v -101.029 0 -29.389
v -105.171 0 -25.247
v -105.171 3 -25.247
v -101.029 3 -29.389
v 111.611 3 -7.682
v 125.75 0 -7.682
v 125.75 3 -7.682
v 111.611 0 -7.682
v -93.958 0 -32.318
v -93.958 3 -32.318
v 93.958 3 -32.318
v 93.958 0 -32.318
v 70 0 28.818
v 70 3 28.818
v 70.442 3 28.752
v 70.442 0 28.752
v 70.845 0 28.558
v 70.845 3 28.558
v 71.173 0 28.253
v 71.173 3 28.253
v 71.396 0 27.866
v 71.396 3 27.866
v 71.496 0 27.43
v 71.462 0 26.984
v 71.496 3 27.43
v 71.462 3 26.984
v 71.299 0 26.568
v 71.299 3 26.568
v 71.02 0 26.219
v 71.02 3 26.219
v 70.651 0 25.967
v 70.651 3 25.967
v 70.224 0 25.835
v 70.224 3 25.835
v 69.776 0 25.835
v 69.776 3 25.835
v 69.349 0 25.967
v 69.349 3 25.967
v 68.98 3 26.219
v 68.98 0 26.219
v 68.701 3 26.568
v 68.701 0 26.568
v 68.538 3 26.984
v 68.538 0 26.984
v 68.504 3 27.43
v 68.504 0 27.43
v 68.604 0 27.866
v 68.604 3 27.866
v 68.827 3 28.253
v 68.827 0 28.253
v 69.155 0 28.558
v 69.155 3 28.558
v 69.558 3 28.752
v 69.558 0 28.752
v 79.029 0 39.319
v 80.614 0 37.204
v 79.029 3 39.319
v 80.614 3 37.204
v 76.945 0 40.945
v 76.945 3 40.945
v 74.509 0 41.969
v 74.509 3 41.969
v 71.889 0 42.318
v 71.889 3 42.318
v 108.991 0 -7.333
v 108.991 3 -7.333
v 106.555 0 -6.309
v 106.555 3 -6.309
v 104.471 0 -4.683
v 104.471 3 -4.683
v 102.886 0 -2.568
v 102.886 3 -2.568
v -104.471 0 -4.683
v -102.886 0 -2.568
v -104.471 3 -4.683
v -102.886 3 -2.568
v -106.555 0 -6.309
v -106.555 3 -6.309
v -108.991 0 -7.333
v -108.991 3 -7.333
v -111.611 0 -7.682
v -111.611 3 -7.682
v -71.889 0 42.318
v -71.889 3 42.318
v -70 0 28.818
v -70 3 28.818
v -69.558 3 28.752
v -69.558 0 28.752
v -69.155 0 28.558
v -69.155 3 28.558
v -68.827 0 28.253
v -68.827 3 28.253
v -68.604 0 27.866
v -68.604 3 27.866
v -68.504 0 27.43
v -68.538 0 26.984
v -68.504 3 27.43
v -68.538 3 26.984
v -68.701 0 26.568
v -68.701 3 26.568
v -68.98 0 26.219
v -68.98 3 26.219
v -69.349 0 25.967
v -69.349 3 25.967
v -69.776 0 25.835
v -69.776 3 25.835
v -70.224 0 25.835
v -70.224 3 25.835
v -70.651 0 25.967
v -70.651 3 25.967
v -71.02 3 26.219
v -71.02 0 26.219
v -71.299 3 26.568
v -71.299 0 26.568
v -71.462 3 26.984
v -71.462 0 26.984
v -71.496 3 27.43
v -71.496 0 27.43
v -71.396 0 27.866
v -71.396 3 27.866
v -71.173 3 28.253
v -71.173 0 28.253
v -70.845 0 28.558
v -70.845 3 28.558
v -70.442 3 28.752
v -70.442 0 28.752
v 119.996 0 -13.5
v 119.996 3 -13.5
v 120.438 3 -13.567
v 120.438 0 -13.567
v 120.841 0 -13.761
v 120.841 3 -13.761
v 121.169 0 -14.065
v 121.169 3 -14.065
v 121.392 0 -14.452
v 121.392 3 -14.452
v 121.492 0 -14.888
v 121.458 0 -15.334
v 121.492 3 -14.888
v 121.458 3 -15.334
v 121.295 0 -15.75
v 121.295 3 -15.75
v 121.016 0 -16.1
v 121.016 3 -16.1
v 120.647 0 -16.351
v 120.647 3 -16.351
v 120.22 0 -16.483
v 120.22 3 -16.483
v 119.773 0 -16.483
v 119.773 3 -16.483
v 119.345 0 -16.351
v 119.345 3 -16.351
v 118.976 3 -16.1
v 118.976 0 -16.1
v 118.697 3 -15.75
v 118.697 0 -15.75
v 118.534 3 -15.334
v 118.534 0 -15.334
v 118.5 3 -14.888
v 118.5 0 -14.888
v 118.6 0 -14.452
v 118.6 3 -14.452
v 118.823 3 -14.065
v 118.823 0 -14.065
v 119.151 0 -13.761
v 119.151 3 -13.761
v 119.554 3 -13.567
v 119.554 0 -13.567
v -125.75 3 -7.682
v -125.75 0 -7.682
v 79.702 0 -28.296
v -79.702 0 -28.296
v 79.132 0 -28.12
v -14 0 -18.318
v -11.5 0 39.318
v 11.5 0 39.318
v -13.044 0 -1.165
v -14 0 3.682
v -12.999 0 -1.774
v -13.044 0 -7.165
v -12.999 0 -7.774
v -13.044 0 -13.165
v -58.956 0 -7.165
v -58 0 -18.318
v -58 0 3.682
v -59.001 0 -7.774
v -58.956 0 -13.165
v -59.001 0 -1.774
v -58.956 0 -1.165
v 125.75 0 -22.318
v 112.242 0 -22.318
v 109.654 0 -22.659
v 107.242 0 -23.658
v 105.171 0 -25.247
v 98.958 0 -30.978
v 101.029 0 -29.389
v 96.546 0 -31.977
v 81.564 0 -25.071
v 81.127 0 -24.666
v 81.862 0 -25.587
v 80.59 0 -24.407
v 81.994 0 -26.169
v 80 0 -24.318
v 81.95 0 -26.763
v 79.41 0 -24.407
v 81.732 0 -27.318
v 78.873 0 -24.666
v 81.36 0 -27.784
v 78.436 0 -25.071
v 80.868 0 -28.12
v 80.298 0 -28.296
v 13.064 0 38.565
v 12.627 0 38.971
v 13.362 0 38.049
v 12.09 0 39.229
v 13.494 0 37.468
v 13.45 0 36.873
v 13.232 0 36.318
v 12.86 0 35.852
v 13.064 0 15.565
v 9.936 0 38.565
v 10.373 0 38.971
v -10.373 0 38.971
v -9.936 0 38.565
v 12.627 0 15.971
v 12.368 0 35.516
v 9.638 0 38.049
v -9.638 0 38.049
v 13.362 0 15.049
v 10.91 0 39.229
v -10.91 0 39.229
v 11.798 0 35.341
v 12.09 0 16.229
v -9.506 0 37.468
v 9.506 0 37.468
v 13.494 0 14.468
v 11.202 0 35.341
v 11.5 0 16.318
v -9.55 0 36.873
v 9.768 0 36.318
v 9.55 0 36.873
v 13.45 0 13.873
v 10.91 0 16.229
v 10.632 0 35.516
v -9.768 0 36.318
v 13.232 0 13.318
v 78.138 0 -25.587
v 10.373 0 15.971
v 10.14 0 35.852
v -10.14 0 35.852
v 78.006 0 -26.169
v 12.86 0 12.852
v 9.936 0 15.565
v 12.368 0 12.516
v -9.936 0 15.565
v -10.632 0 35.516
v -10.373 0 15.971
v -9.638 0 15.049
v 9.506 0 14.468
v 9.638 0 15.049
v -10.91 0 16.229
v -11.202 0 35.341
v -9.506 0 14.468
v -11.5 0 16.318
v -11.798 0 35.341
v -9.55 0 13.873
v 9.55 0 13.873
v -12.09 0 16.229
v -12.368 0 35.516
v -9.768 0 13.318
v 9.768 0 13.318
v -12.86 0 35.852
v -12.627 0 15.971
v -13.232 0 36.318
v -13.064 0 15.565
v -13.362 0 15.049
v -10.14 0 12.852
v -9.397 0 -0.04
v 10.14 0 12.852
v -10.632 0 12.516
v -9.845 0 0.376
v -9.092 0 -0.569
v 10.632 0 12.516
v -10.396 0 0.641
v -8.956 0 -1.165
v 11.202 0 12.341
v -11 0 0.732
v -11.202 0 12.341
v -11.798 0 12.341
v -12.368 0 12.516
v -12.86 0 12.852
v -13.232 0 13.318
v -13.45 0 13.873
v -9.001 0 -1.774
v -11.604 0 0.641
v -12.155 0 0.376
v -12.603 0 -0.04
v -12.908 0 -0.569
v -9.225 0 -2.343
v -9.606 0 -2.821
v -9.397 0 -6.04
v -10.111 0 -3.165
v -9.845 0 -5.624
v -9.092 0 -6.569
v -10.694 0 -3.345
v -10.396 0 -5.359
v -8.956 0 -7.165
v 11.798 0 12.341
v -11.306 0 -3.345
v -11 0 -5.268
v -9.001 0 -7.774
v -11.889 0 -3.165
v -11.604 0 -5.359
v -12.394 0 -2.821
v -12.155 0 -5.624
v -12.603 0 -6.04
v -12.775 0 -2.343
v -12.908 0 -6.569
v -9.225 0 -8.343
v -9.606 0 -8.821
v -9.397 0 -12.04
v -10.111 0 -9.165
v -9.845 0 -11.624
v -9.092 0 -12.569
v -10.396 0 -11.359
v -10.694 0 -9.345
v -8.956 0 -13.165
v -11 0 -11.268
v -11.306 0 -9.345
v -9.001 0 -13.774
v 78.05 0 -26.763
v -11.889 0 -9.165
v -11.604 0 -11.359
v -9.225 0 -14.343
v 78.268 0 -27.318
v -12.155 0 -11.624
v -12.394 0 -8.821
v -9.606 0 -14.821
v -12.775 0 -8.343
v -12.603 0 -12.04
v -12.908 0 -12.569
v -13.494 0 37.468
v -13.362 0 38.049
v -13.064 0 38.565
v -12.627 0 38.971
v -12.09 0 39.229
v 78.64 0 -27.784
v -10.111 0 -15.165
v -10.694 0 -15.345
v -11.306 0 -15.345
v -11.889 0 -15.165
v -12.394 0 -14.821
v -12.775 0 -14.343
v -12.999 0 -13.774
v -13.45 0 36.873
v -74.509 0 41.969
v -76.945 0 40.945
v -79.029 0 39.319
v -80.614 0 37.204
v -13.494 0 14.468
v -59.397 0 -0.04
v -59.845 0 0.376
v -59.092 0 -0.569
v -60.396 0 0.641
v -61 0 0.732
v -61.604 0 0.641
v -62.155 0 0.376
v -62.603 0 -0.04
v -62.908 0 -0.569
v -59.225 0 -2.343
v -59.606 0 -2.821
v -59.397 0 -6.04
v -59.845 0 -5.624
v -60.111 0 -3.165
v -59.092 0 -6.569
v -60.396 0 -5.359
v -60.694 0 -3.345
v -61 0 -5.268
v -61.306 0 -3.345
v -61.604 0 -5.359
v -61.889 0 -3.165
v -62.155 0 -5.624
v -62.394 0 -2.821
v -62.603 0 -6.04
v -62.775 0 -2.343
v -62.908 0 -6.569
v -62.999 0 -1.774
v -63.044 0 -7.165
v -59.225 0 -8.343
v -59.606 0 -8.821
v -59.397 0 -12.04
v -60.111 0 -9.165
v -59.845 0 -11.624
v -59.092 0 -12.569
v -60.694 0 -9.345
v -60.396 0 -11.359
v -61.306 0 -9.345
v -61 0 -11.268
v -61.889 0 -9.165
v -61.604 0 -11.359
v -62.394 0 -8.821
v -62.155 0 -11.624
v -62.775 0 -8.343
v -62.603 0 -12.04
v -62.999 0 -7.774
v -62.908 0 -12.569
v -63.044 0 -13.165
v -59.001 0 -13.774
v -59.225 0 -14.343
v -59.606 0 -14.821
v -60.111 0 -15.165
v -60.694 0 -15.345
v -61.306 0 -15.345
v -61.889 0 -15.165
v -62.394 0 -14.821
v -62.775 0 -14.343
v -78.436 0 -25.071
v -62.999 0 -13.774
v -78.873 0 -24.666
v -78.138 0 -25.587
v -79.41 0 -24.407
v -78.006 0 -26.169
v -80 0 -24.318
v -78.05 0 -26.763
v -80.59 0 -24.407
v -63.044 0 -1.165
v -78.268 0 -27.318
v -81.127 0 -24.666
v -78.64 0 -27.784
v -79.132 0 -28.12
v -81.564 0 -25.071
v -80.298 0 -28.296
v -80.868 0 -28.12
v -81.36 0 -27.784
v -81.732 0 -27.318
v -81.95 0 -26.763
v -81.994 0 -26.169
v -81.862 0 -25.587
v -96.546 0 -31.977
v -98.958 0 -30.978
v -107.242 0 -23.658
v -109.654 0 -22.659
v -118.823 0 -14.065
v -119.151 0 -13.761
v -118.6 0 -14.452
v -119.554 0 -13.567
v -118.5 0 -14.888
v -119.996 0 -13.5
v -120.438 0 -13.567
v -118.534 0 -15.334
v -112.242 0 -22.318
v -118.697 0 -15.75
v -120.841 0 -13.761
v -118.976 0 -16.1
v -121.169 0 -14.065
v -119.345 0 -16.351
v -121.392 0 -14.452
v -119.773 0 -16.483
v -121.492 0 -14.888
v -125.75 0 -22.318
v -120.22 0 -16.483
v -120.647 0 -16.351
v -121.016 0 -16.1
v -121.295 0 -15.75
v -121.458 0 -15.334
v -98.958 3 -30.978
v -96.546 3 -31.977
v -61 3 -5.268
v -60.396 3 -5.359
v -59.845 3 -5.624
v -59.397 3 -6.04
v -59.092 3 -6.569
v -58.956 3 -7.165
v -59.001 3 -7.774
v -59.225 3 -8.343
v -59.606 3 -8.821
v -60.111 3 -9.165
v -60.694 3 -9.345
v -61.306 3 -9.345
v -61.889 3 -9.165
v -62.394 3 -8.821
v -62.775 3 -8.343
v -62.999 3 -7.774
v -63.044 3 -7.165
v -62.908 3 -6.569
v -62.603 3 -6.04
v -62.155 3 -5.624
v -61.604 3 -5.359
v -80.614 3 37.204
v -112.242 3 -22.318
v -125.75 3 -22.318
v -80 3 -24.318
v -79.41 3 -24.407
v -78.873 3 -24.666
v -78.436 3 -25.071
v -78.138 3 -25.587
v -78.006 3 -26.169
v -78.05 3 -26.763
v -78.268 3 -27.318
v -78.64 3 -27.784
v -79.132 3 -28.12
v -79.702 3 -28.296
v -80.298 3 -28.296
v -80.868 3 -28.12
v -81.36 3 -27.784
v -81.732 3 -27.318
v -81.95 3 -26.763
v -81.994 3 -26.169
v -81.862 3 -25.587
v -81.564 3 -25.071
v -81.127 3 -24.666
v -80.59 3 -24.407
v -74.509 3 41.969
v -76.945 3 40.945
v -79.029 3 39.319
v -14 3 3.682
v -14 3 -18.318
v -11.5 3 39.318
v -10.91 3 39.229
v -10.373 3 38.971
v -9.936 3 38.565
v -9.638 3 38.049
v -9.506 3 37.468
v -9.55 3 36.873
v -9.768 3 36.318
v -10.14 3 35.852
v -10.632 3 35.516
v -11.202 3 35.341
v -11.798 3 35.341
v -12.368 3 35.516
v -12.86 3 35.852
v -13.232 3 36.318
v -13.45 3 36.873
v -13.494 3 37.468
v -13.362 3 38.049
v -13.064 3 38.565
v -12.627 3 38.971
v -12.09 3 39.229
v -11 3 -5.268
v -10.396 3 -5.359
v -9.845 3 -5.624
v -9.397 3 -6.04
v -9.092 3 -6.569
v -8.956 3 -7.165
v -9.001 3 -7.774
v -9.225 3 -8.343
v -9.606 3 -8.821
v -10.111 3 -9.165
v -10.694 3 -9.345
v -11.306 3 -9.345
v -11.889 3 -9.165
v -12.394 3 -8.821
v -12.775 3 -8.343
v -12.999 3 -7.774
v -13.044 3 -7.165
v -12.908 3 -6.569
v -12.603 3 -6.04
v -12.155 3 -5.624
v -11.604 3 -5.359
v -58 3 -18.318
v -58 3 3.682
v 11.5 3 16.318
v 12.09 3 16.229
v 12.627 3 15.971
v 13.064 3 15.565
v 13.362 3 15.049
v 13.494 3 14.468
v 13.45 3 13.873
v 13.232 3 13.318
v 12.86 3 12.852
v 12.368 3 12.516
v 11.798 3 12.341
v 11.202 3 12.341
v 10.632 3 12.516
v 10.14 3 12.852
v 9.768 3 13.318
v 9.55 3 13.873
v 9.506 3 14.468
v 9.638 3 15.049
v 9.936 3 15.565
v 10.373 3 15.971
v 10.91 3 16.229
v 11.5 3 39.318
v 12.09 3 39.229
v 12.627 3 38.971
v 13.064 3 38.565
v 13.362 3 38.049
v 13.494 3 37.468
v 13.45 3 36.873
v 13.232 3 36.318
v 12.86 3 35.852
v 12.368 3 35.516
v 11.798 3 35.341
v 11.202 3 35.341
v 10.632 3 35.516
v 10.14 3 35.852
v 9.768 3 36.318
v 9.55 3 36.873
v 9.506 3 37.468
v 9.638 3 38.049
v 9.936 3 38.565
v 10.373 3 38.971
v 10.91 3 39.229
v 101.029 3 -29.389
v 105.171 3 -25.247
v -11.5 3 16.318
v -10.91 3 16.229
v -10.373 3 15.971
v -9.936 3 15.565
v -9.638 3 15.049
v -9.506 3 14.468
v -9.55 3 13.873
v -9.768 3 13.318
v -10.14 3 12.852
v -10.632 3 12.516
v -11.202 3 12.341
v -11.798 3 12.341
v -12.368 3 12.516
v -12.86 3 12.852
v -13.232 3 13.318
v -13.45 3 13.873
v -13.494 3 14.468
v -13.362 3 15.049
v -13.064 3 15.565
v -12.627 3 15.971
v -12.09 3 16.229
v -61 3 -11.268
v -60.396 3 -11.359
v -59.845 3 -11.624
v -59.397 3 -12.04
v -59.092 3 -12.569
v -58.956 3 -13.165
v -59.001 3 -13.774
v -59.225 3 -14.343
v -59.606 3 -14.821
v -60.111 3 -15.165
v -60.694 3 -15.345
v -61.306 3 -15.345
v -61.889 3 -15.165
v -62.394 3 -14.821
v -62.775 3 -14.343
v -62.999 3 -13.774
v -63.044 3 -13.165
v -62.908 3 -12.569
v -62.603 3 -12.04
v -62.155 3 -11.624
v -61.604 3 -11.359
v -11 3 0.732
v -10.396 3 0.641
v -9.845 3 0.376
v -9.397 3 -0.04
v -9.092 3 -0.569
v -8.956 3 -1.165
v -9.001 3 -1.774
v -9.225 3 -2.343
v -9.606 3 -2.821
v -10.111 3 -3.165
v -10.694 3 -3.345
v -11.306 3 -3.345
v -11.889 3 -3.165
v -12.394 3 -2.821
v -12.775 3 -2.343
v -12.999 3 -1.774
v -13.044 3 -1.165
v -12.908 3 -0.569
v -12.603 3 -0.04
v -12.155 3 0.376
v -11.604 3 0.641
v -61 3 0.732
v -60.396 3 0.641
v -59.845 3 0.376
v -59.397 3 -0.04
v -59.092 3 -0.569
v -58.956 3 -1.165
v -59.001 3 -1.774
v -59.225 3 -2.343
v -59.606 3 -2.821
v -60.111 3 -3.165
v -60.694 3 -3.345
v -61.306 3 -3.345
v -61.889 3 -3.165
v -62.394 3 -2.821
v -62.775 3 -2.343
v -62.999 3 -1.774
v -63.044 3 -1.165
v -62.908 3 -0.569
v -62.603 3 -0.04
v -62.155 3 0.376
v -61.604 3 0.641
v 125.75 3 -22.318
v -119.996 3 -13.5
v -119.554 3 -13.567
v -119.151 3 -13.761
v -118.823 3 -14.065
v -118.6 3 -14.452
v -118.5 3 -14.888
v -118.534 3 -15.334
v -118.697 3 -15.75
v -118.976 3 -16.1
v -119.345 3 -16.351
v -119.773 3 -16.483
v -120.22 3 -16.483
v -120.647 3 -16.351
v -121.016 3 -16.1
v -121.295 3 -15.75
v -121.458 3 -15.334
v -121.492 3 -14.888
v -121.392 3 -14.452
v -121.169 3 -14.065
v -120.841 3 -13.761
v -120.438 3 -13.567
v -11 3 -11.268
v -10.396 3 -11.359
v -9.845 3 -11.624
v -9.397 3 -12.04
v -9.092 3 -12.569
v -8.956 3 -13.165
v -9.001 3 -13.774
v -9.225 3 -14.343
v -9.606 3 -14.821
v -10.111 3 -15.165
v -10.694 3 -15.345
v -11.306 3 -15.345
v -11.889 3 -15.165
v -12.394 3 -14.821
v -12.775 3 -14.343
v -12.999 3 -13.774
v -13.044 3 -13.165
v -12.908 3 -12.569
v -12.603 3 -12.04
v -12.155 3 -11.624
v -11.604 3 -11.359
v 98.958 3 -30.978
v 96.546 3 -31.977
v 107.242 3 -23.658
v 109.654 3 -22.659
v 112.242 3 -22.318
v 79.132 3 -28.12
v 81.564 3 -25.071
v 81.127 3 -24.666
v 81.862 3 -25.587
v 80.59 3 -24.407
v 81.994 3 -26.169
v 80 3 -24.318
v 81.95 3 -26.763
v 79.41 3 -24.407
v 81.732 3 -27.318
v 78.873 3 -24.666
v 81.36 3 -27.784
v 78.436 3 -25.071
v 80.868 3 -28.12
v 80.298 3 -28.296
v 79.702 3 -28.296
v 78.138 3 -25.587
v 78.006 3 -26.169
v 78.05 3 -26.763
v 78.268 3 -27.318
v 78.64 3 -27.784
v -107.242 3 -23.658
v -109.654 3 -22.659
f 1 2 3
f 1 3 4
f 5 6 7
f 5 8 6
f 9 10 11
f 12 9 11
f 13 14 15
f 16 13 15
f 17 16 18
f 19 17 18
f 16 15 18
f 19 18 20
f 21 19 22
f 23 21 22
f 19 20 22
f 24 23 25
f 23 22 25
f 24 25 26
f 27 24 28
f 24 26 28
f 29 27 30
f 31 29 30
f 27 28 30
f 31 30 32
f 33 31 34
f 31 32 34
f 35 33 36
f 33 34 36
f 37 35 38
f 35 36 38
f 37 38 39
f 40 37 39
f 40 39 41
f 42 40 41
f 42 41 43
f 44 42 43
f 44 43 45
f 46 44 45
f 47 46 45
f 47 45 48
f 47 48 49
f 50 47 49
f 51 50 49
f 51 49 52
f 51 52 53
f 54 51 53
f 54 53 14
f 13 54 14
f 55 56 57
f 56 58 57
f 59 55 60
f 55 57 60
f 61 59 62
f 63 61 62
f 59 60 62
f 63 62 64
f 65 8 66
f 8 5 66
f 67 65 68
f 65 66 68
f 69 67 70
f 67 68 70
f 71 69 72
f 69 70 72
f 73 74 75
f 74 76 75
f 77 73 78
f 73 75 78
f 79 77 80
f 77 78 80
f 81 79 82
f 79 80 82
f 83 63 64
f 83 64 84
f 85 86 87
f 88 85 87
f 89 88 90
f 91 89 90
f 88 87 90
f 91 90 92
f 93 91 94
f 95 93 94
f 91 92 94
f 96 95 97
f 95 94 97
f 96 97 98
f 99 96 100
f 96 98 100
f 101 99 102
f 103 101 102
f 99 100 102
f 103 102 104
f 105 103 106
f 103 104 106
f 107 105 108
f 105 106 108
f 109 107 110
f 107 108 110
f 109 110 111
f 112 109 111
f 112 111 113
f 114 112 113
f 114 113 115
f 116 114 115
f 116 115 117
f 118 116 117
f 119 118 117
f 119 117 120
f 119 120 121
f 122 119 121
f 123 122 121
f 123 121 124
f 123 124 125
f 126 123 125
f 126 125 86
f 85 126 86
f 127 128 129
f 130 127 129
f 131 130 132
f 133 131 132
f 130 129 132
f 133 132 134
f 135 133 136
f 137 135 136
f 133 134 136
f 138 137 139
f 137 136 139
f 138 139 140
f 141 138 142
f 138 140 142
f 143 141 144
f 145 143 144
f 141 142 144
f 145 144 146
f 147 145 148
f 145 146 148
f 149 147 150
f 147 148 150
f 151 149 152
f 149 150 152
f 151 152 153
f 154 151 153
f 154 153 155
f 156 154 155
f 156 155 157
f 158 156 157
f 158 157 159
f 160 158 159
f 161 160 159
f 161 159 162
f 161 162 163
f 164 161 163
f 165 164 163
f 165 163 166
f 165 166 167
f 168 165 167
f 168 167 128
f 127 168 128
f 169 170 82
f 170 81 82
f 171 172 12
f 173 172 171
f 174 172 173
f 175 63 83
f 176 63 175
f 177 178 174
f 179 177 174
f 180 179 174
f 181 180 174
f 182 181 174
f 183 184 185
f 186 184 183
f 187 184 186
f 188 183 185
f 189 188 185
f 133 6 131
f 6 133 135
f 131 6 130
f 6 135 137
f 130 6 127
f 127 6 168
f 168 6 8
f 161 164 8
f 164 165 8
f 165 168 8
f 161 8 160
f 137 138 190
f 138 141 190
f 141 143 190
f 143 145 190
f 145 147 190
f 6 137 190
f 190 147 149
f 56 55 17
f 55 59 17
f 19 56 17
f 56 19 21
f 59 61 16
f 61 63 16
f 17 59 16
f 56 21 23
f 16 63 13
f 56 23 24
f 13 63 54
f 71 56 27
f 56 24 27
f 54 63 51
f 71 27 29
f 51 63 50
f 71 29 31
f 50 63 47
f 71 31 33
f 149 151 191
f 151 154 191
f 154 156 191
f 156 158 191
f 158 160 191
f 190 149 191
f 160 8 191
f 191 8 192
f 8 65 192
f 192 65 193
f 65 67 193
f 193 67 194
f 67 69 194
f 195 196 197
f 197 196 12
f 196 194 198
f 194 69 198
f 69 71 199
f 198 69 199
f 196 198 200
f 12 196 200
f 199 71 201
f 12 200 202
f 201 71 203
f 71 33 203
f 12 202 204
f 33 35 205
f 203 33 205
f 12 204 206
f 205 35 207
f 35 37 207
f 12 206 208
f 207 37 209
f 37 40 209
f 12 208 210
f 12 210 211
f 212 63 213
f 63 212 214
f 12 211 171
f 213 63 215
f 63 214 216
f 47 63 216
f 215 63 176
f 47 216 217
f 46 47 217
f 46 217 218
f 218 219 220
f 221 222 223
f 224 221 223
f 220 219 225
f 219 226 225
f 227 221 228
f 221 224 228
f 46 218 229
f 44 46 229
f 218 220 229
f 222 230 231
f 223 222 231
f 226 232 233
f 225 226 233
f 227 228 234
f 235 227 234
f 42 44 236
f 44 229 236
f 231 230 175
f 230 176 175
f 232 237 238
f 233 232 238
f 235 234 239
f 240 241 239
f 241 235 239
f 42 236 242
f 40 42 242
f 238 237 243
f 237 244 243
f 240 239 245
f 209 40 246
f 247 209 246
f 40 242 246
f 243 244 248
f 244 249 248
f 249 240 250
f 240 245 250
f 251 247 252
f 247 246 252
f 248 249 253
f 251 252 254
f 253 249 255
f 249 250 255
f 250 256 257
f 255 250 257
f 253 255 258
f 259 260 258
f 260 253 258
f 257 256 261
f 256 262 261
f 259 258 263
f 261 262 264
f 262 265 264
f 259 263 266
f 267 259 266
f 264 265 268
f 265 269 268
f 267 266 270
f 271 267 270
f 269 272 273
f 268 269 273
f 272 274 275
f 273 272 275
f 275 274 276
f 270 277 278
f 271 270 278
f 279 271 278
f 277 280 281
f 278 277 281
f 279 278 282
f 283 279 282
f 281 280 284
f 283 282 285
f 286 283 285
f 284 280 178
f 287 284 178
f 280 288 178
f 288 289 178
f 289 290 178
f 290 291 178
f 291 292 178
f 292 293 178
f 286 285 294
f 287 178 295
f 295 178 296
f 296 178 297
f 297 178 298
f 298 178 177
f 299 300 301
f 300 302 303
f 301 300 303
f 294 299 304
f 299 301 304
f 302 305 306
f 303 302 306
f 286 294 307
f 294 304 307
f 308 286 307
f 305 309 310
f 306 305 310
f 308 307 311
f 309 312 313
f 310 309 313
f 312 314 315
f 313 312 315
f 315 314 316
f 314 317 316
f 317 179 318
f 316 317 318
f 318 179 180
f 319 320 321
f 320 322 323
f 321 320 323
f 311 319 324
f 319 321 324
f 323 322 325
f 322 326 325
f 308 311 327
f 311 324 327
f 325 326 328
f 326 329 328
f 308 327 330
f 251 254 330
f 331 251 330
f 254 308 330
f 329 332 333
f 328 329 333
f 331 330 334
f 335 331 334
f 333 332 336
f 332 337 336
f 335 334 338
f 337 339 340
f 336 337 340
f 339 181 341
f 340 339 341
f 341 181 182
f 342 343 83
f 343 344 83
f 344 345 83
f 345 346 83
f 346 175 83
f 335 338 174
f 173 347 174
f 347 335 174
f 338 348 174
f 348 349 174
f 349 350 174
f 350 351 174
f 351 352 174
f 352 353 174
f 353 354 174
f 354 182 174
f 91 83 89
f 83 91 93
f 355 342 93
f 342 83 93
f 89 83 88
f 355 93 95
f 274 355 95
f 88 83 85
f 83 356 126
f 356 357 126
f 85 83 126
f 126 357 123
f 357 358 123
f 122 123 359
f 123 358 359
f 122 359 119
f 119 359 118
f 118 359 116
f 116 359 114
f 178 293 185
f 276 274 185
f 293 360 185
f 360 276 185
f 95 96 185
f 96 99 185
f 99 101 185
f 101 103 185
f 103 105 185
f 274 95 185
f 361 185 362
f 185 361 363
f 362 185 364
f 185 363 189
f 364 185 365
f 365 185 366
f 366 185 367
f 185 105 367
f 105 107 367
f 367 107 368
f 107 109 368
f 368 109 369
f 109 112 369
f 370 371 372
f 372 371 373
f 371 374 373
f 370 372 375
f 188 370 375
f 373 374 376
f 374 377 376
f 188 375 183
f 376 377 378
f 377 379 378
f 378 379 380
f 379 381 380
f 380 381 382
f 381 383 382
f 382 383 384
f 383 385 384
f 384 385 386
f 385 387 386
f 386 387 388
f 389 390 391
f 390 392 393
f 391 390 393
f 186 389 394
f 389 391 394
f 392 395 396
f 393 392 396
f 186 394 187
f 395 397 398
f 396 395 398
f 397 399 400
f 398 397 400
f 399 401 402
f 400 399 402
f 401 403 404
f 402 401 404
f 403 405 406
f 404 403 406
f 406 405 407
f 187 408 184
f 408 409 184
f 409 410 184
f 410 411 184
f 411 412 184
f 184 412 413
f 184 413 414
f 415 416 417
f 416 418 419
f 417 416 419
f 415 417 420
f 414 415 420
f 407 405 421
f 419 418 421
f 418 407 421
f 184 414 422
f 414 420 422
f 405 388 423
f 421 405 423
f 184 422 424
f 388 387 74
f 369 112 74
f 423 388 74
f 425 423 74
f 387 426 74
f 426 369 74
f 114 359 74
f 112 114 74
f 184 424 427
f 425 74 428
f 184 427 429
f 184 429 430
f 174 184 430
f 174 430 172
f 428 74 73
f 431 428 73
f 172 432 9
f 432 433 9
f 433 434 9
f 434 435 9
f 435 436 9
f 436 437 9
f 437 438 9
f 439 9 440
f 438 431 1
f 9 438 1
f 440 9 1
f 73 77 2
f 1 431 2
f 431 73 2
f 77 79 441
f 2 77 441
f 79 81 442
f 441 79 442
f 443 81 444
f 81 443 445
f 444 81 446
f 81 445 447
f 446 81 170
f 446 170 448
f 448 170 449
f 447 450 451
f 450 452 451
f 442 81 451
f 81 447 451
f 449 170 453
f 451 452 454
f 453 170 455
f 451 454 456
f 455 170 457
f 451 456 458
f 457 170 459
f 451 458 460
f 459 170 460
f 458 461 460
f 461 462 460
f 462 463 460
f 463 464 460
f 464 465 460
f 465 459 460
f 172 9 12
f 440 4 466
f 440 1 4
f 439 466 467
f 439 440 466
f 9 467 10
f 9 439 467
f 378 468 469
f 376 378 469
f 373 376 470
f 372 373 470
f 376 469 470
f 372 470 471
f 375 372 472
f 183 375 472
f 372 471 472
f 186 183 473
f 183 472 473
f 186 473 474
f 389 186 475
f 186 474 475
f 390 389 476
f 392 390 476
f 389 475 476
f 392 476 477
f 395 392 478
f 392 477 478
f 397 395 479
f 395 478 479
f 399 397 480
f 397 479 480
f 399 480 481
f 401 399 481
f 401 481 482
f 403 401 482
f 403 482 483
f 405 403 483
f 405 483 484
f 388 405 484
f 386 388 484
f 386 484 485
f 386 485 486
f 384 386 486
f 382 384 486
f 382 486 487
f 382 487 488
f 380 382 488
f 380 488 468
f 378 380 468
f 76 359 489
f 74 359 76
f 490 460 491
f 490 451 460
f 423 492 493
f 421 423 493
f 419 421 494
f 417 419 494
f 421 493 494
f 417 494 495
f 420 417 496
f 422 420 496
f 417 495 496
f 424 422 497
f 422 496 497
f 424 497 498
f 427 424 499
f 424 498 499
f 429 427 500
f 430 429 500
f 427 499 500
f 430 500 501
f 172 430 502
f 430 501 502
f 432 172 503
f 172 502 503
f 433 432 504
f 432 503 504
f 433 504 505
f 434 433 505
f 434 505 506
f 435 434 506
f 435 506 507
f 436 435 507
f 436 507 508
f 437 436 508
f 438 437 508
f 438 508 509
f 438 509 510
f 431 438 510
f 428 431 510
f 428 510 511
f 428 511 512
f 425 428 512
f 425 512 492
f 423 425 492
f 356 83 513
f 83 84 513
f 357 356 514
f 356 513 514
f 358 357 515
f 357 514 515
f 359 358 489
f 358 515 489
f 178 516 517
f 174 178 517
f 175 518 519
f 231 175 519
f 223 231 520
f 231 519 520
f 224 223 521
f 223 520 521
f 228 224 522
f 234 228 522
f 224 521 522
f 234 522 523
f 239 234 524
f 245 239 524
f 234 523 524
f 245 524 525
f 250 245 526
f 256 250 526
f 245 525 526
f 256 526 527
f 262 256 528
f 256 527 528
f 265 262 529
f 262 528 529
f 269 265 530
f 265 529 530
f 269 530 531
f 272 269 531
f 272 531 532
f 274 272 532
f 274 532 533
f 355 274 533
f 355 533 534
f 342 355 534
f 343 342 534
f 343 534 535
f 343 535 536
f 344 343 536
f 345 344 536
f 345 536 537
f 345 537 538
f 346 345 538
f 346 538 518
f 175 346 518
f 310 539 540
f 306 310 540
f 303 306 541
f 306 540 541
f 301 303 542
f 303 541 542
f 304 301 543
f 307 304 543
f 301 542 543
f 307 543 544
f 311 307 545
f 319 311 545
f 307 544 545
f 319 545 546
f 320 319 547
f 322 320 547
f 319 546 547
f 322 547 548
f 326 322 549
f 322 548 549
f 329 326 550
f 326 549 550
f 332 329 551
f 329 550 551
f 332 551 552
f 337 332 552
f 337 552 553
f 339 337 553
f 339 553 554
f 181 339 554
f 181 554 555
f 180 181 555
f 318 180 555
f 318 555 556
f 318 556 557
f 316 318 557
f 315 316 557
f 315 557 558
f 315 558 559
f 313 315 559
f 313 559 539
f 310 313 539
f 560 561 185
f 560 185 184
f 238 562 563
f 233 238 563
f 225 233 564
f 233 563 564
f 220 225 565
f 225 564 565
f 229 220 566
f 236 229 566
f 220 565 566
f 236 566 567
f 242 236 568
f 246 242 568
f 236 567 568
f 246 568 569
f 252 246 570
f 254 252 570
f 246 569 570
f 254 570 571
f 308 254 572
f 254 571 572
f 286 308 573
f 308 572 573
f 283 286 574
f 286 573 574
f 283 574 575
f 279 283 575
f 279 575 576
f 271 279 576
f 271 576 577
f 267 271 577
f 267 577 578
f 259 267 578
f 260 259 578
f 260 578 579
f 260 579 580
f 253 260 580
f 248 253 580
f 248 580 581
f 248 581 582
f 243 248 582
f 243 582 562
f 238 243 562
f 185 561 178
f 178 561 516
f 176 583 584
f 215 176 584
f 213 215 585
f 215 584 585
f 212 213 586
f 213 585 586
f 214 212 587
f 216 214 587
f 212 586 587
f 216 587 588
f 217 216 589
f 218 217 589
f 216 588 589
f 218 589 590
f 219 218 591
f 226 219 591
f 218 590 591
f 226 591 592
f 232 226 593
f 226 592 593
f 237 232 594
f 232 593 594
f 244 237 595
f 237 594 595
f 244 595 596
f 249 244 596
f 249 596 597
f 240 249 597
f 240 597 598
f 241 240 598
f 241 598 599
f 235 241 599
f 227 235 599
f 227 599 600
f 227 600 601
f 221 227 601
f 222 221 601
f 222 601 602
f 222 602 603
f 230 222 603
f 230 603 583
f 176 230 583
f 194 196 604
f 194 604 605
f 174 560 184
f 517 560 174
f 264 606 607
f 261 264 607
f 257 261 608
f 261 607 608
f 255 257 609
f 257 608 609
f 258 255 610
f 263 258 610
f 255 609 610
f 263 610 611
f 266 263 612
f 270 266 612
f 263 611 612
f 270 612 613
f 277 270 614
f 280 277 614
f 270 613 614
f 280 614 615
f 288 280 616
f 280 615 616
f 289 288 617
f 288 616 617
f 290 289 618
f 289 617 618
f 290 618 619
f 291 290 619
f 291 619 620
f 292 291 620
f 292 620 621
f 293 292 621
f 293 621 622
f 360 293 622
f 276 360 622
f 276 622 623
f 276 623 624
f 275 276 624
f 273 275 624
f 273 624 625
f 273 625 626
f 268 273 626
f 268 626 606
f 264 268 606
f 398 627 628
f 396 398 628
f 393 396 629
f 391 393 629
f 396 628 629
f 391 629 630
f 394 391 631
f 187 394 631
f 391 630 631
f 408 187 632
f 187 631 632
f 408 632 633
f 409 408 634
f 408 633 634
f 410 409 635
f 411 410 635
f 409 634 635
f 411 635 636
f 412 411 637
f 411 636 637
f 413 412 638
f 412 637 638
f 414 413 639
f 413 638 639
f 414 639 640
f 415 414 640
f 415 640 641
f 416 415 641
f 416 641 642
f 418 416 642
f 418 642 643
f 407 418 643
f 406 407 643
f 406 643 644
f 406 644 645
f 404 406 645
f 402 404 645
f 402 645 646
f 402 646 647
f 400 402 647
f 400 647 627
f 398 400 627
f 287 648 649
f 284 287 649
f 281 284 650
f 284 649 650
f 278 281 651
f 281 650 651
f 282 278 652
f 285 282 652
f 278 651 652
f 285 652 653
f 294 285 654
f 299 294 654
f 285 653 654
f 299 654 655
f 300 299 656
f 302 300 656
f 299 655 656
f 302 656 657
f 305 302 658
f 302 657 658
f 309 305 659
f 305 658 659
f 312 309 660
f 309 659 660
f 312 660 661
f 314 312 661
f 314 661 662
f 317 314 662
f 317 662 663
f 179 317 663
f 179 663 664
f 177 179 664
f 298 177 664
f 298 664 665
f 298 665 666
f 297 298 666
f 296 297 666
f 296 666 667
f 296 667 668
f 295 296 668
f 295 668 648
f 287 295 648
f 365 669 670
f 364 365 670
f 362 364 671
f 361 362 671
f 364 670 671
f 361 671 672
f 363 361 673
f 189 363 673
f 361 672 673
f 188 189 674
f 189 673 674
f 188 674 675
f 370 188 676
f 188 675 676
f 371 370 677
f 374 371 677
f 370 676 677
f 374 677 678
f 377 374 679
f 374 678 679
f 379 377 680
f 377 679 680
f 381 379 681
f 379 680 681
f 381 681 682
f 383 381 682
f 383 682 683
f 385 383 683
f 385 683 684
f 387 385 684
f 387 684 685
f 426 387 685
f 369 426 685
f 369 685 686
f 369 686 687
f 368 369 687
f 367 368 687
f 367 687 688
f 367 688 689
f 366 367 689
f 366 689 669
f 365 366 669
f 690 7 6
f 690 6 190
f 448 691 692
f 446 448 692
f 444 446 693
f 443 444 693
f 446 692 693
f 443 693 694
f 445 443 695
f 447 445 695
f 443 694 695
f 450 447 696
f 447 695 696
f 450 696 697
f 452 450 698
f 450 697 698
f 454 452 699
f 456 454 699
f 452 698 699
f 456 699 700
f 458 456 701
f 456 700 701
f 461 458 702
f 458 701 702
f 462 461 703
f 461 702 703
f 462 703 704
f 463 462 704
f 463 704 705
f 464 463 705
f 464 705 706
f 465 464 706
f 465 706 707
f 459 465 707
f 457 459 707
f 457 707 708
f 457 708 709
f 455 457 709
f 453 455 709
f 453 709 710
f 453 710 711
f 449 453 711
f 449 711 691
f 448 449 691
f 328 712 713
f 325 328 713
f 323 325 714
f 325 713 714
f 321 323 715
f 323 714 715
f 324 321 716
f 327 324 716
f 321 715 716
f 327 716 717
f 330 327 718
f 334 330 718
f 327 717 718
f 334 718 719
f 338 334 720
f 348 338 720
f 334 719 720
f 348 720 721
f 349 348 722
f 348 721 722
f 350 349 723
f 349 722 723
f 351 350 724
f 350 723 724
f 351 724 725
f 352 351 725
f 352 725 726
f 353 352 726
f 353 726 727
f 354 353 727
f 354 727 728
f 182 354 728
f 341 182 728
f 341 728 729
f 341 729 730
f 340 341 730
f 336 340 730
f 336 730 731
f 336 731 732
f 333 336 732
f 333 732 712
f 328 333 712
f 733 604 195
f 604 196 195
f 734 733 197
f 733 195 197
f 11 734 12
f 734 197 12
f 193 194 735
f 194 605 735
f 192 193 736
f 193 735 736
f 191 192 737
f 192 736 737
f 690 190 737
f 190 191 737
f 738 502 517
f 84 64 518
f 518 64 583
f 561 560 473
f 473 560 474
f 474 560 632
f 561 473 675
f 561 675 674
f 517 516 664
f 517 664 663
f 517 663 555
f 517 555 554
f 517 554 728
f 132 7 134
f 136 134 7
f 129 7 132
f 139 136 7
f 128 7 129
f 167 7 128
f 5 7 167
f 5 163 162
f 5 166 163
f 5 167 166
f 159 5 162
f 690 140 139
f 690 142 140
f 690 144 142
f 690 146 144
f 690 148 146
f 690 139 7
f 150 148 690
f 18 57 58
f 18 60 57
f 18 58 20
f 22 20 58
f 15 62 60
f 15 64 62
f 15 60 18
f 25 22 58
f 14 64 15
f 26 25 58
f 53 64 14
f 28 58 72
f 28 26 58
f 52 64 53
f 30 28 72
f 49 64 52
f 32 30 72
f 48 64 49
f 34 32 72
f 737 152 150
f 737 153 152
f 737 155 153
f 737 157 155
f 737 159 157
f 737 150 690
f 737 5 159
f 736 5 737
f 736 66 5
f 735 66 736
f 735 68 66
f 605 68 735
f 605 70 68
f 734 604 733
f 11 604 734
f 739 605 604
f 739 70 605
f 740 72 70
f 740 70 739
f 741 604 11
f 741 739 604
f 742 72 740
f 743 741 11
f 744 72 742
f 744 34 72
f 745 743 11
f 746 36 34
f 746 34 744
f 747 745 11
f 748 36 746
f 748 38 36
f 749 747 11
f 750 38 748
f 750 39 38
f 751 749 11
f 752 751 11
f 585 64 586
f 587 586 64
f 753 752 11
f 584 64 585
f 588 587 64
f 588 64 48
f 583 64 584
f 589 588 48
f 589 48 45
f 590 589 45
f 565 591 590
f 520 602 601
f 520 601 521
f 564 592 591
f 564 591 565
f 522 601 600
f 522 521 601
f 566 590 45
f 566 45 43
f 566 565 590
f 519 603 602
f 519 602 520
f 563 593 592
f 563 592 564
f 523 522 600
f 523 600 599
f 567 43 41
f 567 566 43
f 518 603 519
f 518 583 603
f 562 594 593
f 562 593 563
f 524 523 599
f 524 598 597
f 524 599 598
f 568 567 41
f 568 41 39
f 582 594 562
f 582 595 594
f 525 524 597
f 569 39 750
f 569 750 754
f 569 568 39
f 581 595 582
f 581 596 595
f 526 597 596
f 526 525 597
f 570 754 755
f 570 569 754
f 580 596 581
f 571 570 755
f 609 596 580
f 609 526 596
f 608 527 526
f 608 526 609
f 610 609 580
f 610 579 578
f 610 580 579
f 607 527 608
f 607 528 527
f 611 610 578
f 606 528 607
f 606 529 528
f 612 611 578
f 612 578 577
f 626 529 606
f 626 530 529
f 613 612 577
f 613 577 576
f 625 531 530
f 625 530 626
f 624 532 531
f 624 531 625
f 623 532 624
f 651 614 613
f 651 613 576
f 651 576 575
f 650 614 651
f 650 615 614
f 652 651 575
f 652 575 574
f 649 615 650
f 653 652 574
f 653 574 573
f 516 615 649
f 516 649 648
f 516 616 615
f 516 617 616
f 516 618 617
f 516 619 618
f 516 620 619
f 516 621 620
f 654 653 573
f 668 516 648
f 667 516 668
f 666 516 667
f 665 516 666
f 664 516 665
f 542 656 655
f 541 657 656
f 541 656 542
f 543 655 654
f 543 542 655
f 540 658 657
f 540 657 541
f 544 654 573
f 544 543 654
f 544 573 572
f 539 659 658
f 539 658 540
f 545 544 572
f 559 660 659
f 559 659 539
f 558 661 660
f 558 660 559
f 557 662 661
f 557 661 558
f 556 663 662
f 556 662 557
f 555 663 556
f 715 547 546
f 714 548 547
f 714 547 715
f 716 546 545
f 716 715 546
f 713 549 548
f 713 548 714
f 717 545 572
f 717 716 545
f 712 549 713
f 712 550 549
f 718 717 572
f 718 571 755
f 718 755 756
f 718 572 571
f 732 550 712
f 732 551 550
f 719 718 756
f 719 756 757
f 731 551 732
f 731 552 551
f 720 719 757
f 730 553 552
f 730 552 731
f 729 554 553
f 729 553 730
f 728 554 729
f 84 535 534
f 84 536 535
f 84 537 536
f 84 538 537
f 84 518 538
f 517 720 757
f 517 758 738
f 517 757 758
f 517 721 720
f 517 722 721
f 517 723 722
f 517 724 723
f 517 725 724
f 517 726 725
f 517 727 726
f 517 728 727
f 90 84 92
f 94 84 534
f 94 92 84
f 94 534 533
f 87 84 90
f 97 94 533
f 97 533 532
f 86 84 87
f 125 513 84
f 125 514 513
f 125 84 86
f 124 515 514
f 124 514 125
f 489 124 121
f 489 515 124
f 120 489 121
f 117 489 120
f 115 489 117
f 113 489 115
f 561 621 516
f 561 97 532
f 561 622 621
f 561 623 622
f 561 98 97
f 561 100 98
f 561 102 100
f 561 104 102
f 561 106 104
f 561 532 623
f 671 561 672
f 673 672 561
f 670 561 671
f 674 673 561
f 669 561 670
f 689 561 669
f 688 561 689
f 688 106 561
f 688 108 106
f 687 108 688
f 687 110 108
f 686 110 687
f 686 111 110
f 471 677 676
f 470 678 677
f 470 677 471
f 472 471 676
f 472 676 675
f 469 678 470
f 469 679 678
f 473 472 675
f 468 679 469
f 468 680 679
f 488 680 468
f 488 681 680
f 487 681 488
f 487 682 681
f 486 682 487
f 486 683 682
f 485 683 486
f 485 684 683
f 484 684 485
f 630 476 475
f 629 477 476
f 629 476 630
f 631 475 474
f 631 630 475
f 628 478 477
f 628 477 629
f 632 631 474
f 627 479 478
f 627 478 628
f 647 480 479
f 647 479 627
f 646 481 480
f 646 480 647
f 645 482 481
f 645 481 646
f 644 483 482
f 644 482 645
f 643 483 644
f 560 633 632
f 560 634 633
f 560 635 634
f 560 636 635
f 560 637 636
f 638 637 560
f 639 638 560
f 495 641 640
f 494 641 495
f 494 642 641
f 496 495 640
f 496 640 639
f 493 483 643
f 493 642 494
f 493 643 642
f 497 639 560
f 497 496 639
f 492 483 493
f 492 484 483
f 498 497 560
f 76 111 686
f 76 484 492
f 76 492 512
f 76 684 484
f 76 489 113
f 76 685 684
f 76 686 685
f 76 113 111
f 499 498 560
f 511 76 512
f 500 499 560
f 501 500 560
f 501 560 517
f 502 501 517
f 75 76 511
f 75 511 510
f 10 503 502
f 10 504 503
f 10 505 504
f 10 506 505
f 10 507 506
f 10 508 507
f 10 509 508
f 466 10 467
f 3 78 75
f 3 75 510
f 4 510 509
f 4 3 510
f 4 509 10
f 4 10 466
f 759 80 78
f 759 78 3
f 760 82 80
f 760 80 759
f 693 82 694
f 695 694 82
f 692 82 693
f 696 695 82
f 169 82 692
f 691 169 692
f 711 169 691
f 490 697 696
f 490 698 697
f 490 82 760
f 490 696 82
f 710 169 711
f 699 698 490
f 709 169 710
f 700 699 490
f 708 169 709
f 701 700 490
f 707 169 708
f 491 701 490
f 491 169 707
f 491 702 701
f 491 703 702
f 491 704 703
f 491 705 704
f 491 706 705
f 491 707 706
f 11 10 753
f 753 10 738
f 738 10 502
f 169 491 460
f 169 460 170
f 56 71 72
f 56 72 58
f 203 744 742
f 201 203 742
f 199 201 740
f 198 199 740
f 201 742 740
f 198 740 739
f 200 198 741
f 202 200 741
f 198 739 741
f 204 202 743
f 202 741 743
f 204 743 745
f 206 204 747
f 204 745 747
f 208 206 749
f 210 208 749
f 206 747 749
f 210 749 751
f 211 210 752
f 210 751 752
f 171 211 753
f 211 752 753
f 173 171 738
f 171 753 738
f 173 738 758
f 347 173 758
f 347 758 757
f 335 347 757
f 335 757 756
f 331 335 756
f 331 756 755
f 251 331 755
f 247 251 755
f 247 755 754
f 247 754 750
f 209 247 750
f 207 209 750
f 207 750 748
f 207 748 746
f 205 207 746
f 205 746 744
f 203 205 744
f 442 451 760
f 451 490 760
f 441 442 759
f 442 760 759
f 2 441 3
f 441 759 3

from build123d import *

# Parameters (mm, degrees)
SALIENTE_EXTRUIR1_DEPTH = 3
REDONDEO1_R             = 10
CROQUIS2_R              = 1.5
CROQUIS2_R_2            = 2
CROQUIS2_R_3            = 2.05
CROQUIS2_W              = 42
CROQUIS2_H              = 20
CORTAR_EXTRUIR1_DEPTH   = 135.610141171
CROQUIS3_W              = 4
CROQUIS3_H              = 14.636342218
CORTAR_EXTRUIR2_DEPTH   = 135.610141171
CROQUIS4_W              = 44
CROQUIS4_H              = 22
CORTAR_EXTRUIR3_DEPTH   = 131.820067673
CORTAR_EXTRUIR4_DEPTH   = 131.820067673
REDONDEO2_R             = 20
CORTAR_EXTRUIR5_DEPTH   = 10
REDONDEO3_R             = 10
CROQUIS7_W              = 14.636342218
CROQUIS7_H              = 3
SALIENTE_EXTRUIR2_DEPTH = 2
CROQUIS8_W              = 14.636342218
CROQUIS8_H              = 3
SALIENTE_EXTRUIR3_DEPTH = 2
CROQUIS10_R             = 2
CORTAR_EXTRUIR7_DEPTH   = 133.713564137


with BuildPart() as part:
    # Croquis1 → Saliente-Extruir1 (new body)
    with BuildSketch(Plane(origin=(0, 0, 0), x_dir=(1, 0, 0), z_dir=(0, 1, 0))):
        Polygon((-88.1, 42.318171109), (88.1, 42.318171109), (108.1, 22.318171109), (127.75, 22.318171109), (127.75, 7.681828891), (105.75, 7.681828891), (77.75, -42.318171109), (-77.75, -42.318171109), (-105.75, 7.681828891), (-127.75, 7.681828891), (-127.75, 22.318171109), (-108.1, 22.318171109), align=None)
    extrude(amount=SALIENTE_EXTRUIR1_DEPTH)

    # Redondeo1
    redondeo1_edges = [part.edges().sort_by_distance(p)[0] for p in [
        (-88.1, 1.5, -42.318171109),
        (88.1, 1.5, -42.318171109),
        (108.1, 1.5, -22.318171109),
        (105.75, 1.5, -7.681828891),
        (77.75, 1.5, 42.318171109),
        (-77.75, 1.5, 42.318171109),
        (-105.75, 1.5, -7.681828891),
        (-108.1, 1.5, -22.318171109),
    ]]
    fillet(redondeo1_edges, radius=REDONDEO1_R)

    # Croquis2 → Cortar-Extruir1 (cut, through all)
    with BuildSketch(Plane(origin=(0, 3, 0), x_dir=(1, 0, 0), z_dir=(0, 1, 0))):
        with Locations(Location((70, -27.318171109, 0), (0, 0, 270))):
            Circle(CROQUIS2_R)
        with Locations(Location((-70, -27.318171109, 0), (0, 0, 270))):
            Circle(CROQUIS2_R)
        with Locations(Location((-119.996067812, 15, 0), (0, 0, 270))):
            Circle(CROQUIS2_R)
        with Locations(Location((119.996067812, 15, 0), (0, 0, 270))):
            Circle(CROQUIS2_R)
        with Locations(Location((-11.5, -14.318171109, 0), (0, 0, 270))):
            Circle(CROQUIS2_R_2)
        with Locations(Location((11.5, -14.318171109, 0), (0, 0, 270))):
            Circle(CROQUIS2_R_2)
        with Locations(Location((-11.5, -37.318171109, 0), (0, 0, 270))):
            Circle(CROQUIS2_R_2)
        with Locations(Location((11.5, -37.318171109, 0), (0, 0, 270))):
            Circle(CROQUIS2_R_2)
        with Locations(Location((-61, 7.318171109, 0), (0, 0, 270))):
            Circle(CROQUIS2_R_3)
        with Locations(Location((-11, 7.318171109, 0), (0, 0, 270))):
            Circle(CROQUIS2_R_3)
        with Locations(Location((-61, 13.318171109, 0), (0, 0, 270))):
            Circle(CROQUIS2_R_3)
        with Locations(Location((-61, 1.318171109, 0), (0, 0, 270))):
            Circle(CROQUIS2_R_3)
        with Locations(Location((-11, 13.318171109, 0), (0, 0, 270))):
            Circle(CROQUIS2_R_3)
        with Locations(Location((-11, 1.318171109, 0), (0, 0, 270))):
            Circle(CROQUIS2_R_3)
        with Locations((-36, 7.318171109)):
            Rectangle(CROQUIS2_W, CROQUIS2_H)
    extrude(amount=-CORTAR_EXTRUIR1_DEPTH, mode=Mode.SUBTRACT)

    # Croquis3 → Cortar-Extruir2 (cut, through all)
    with BuildSketch(Plane(origin=(0, 3, 0), x_dir=(1, 0, 0), z_dir=(0, 1, 0))):
        with Locations((-125.75, 15)):
            Rectangle(CROQUIS3_W, CROQUIS3_H)
        with Locations((125.75, 15)):
            Rectangle(CROQUIS3_W, CROQUIS3_H)
    extrude(amount=-CORTAR_EXTRUIR2_DEPTH, mode=Mode.SUBTRACT)

    # Croquis4 → Cortar-Extruir3 (cut, through all)
    with BuildSketch(Plane(origin=(0, 3, 0), x_dir=(1, 0, 0), z_dir=(0, 1, 0))):
        with Locations((-36, 7.318171109)):
            Rectangle(CROQUIS4_W, CROQUIS4_H)
    extrude(amount=-CORTAR_EXTRUIR3_DEPTH, mode=Mode.SUBTRACT)

    # Croquis5 → Cortar-Extruir4 (cut, through all)
    with BuildSketch(Plane(origin=(0, 3, 0), x_dir=(1, 0, 0), z_dir=(0, 1, 0))):
        Polygon((-63.75, 42.318171109), (-38.75, 32.318171109), (38.75, 32.318171109), (63.75, 42.318171109), align=None)
    extrude(amount=-CORTAR_EXTRUIR4_DEPTH, mode=Mode.SUBTRACT)

    # Redondeo2
    redondeo2_edges = [part.edges().sort_by_distance(p)[0] for p in [
        (-63.75, 1.5, -42.318171109),
        (63.75, 1.5, -42.318171109),
        (38.75, 1.5, -32.318171109),
        (-38.75, 1.5, -32.318171109),
    ]]
    fillet(redondeo2_edges, radius=REDONDEO2_R)

    # Croquis6 → Cortar-Extruir5 (cut)
    with BuildSketch(Plane(origin=(0, 3, 0), x_dir=(1, 0, 0), z_dir=(0, 1, 0))):
        Polygon((-34.898351929, 32.318171109), (-98.1, 32.318171109), (-98.1, 50.604425951), (105.42793471, 50.604425951), (105.42793471, 32.318171109), align=None)
    extrude(amount=-CORTAR_EXTRUIR5_DEPTH, mode=Mode.SUBTRACT)

    # Redondeo3
    redondeo3_edges = [part.edges().sort_by_distance(p)[0] for p in [
        (98.1, 1.5, -32.318171109),
        (-98.1, 1.5, -32.318171109),
    ]]
    fillet(redondeo3_edges, radius=REDONDEO3_R)

    # Croquis7 → Saliente-Extruir2 (add)
    with BuildSketch(Plane.ZY.offset(123.75)):
        with Locations((-15, 1.5)):
            Rectangle(CROQUIS7_W, CROQUIS7_H)
    extrude(amount=SALIENTE_EXTRUIR2_DEPTH)

    # Croquis8 → Saliente-Extruir3 (add)
    with BuildSketch(Plane(origin=(123.75, 0, 0), x_dir=(0, 0, -1), z_dir=(1, 0, 0))):
        with Locations((15, 1.5)):
            Rectangle(CROQUIS8_W, CROQUIS8_H)
    extrude(amount=SALIENTE_EXTRUIR3_DEPTH)

    # Croquis10 → Cortar-Extruir7 (cut, through all)
    with BuildSketch(Plane(origin=(0, 3, 0), x_dir=(1, 0, 0), z_dir=(0, 1, 0))):
        with Locations(Location((-80, 26.318171109, 0), (0, 0, 270))):
            Circle(CROQUIS10_R)
        with Locations(Location((80, 26.318171109, 0), (0, 0, 270))):
            Circle(CROQUIS10_R)
    extrude(amount=-CORTAR_EXTRUIR7_DEPTH, mode=Mode.SUBTRACT)


solid = part.part
